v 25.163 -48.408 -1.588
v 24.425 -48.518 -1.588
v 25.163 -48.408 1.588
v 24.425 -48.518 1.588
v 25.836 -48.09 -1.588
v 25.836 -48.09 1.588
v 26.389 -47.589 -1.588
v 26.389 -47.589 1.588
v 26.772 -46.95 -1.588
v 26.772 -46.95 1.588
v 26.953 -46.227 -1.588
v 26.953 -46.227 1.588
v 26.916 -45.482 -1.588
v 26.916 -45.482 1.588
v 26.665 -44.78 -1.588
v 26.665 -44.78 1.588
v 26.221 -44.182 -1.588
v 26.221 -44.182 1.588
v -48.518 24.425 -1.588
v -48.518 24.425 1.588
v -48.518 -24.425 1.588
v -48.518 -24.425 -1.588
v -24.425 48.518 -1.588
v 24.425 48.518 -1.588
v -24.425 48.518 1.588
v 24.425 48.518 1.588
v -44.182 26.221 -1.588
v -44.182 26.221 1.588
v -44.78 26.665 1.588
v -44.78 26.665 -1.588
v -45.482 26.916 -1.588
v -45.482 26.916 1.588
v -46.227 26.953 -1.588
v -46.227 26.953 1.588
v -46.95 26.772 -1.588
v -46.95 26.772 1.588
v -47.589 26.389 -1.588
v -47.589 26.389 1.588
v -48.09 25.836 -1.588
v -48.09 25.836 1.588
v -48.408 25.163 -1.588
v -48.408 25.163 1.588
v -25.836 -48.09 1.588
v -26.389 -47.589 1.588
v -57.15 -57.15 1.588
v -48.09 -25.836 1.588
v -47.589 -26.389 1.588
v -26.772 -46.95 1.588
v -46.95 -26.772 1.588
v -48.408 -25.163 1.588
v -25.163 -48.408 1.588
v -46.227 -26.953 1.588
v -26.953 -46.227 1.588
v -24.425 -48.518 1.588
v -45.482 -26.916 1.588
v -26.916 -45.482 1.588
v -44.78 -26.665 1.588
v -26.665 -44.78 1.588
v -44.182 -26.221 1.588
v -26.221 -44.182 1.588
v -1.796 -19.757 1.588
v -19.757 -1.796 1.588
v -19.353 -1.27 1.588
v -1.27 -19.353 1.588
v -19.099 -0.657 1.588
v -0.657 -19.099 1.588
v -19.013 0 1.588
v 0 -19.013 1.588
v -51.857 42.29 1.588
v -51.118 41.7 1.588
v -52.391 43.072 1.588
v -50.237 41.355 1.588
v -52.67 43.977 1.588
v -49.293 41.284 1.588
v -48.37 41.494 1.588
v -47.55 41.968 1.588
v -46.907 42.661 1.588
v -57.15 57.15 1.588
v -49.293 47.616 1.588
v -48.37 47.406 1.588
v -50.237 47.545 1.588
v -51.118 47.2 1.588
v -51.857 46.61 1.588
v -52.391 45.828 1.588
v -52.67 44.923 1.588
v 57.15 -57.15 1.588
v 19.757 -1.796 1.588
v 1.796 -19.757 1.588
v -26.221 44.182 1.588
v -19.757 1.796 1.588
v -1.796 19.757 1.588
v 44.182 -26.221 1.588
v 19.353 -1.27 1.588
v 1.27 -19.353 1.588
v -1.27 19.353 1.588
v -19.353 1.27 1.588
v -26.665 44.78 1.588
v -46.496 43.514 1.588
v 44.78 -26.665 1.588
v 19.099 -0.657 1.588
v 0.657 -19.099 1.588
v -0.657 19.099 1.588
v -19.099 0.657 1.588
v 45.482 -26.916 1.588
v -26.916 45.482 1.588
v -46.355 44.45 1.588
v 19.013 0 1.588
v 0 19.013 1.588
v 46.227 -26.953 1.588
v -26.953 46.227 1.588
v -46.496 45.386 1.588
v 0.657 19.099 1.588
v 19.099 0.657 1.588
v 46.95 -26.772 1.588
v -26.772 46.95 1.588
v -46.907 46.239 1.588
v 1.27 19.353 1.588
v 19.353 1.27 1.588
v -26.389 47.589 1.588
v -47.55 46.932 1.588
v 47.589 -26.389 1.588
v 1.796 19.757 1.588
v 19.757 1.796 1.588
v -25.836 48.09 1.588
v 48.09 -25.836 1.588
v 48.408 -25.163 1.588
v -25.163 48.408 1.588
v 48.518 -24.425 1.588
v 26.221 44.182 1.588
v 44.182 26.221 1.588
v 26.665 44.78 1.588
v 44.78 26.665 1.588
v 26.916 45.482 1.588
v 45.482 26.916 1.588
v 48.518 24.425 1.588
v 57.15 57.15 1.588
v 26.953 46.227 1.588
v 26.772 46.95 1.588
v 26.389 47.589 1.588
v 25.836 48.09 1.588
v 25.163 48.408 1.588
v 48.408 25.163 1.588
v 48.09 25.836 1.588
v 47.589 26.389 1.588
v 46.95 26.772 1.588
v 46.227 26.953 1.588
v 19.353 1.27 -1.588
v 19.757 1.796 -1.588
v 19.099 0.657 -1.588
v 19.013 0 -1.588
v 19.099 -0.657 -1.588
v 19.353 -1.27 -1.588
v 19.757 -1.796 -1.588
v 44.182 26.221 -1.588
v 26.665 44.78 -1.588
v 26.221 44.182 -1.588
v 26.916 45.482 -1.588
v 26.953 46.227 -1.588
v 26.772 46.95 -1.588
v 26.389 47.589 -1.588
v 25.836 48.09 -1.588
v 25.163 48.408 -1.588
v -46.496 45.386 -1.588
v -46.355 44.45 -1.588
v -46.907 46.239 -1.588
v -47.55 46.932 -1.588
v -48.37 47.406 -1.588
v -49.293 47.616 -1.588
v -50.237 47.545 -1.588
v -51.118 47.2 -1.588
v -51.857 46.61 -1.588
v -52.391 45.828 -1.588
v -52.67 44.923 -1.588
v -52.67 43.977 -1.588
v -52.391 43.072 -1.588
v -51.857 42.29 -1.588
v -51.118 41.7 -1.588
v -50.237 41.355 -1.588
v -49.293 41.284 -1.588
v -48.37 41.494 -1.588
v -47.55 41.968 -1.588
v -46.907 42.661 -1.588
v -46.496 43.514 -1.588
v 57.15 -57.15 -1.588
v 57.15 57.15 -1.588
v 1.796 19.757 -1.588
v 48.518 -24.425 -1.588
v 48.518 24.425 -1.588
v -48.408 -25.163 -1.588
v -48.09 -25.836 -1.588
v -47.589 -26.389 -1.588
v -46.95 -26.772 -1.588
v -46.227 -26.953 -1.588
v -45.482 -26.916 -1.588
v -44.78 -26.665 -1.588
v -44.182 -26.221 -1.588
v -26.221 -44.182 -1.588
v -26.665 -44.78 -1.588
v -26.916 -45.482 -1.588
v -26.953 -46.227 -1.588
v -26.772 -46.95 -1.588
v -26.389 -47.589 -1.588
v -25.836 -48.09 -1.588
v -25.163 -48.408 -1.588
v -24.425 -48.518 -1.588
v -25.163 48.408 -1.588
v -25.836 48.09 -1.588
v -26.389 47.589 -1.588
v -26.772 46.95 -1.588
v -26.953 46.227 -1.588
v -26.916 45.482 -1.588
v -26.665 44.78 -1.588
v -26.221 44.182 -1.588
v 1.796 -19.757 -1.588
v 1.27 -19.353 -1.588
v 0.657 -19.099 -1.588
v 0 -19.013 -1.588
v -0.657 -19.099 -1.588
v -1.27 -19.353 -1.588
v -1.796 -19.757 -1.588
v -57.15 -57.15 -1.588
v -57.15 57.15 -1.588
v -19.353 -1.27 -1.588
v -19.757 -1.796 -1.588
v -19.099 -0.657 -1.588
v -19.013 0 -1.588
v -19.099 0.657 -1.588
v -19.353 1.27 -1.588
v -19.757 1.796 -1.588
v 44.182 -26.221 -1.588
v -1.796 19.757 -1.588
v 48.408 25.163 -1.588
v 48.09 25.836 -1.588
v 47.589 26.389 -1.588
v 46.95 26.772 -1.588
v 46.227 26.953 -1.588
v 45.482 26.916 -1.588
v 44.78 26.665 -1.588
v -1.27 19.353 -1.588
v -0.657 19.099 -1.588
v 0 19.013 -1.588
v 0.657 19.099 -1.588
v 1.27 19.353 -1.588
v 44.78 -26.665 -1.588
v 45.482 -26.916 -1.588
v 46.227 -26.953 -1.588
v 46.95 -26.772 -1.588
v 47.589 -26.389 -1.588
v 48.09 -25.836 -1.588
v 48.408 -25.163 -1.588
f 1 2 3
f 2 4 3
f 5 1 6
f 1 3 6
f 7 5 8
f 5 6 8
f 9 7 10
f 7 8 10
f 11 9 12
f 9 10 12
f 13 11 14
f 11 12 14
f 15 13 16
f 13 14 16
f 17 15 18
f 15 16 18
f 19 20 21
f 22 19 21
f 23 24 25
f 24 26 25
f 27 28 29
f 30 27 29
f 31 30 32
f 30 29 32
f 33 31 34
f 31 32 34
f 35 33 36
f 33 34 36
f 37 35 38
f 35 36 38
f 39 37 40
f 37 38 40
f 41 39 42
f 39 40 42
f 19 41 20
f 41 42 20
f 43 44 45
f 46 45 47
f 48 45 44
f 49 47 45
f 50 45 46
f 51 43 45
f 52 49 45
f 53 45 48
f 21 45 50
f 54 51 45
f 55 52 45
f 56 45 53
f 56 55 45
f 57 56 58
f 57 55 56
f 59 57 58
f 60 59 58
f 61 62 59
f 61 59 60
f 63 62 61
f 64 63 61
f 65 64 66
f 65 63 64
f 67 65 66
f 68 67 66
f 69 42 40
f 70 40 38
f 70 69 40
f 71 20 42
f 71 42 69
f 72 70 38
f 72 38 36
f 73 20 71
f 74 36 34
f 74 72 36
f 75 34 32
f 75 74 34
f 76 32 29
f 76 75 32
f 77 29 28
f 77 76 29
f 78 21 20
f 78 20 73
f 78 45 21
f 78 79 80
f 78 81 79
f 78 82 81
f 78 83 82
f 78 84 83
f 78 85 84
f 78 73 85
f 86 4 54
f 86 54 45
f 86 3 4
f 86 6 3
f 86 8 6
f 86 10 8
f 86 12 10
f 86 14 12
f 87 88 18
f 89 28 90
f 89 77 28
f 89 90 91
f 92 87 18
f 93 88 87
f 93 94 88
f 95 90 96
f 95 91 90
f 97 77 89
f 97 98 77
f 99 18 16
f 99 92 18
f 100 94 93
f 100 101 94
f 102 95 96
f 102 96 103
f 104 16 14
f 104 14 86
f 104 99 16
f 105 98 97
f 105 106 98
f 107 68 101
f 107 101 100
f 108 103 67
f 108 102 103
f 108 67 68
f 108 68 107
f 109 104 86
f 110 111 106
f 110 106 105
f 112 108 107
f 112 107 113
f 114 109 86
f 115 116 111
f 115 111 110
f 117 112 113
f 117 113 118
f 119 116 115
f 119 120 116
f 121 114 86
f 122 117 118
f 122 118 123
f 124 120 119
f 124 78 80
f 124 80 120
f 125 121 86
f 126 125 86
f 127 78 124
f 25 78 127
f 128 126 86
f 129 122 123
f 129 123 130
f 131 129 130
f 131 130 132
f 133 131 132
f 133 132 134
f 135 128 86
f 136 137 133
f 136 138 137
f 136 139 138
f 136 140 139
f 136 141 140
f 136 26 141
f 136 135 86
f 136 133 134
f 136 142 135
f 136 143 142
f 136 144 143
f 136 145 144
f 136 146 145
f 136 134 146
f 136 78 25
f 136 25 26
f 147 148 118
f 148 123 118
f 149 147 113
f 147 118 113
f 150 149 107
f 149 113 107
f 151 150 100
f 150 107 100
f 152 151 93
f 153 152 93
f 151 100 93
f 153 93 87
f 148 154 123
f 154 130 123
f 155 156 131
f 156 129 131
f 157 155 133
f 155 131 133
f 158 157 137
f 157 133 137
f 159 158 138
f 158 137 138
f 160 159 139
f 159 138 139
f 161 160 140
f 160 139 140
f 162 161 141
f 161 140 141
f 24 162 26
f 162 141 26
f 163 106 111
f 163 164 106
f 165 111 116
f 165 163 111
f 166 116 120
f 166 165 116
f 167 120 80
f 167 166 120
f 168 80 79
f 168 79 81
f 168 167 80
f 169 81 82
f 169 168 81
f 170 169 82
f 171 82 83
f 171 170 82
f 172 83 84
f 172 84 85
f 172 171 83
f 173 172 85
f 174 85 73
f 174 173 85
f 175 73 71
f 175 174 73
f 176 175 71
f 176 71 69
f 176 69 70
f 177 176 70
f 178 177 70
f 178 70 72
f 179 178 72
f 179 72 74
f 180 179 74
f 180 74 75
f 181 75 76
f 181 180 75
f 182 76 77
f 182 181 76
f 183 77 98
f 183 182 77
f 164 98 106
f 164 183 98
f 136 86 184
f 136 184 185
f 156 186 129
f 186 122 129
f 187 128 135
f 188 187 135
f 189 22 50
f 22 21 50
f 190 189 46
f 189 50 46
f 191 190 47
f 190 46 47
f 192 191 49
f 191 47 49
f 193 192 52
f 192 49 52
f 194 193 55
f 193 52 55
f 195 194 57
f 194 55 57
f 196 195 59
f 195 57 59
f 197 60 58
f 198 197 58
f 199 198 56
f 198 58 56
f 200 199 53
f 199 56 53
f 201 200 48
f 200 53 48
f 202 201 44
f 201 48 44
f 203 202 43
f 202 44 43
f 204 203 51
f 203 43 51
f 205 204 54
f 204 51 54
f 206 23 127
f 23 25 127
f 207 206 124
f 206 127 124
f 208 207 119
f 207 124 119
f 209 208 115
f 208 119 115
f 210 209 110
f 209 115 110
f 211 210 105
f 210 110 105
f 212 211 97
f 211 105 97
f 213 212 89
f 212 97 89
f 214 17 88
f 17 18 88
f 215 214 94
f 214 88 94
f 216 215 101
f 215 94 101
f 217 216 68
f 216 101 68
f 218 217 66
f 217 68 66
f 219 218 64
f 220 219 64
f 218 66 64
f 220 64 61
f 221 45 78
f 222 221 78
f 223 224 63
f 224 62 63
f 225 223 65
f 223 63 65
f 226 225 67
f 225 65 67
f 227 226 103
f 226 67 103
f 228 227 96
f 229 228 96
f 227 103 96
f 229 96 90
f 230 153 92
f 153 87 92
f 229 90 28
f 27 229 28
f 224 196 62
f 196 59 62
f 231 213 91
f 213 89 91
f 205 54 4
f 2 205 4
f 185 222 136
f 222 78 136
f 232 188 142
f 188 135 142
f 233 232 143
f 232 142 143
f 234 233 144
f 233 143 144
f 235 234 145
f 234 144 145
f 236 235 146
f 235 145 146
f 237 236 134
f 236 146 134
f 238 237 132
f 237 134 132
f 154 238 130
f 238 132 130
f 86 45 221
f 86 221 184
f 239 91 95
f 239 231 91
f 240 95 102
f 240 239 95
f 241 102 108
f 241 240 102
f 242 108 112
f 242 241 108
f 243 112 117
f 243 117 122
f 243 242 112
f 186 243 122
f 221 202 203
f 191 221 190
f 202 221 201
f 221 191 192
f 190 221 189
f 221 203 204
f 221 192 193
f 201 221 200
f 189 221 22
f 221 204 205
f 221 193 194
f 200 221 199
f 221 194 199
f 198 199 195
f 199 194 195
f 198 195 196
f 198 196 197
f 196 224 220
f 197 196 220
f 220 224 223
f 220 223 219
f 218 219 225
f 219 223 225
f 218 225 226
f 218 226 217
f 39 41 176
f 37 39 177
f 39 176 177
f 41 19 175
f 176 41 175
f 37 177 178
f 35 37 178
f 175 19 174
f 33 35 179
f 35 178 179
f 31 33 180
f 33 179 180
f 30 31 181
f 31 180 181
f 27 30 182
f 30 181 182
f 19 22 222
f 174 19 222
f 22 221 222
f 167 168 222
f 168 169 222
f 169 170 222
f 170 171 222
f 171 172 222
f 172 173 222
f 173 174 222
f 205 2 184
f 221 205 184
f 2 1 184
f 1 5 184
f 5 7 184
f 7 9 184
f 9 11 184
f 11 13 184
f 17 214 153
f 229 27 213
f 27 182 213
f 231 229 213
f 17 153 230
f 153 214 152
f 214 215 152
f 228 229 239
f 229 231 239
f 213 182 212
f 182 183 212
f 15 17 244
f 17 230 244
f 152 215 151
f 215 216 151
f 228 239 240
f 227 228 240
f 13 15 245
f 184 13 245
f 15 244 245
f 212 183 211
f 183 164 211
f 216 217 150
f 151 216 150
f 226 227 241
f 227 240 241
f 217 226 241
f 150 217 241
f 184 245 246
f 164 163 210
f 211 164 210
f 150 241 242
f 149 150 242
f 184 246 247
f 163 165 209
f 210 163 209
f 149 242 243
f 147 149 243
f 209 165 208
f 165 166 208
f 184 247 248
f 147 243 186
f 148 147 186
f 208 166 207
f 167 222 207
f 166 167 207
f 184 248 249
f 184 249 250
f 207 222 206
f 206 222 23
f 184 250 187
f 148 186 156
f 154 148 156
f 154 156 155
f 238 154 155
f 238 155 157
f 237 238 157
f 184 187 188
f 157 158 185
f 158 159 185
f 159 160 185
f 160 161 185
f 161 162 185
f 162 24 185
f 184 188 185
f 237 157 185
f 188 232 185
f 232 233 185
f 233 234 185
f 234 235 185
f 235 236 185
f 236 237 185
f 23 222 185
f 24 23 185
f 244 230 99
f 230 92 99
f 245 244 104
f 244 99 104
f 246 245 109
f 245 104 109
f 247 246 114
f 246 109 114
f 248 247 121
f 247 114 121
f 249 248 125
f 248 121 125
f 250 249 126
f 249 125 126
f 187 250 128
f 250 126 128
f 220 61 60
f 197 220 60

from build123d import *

# Parameters (mm, degrees)
SKETCH1_W           = 114.3
SKETCH1_H           = 114.3
SKETCH1_R           = 3.175
BOSS_EXTRUDE2_DEPTH = 1.5875


with BuildPart() as part:
    # Sketch1 → Boss-Extrude2 (new, symmetric)
    with BuildSketch(Plane.XY):
        Rectangle(SKETCH1_W, SKETCH1_H)
        with Locations((-49.53, 44.45)):
            Circle(SKETCH1_R, mode=Mode.SUBTRACT)
        with BuildLine():
            Line((-24.425187853, -48.517802544), (24.425187853, -48.517802544))
            ThreePointArc((24.425187853, -48.517802544), (26.771841866, -46.949818462), (26.221239077, -44.181751319))
            Line((26.221239077, -44.181751319), (1.796051224, -19.756563466))
            ThreePointArc((1.796051224, -19.756563466), (0, -19.012614691), (-1.796051224, -19.756563466))
            Line((-1.796051224, -19.756563466), (-26.221239077, -44.181751319))
            ThreePointArc((-26.221239077, -44.181751319), (-26.771841866, -46.949818462), (-24.425187853, -48.517802544))
        make_face(mode=Mode.SUBTRACT)
        with BuildLine():
            Line((-48.517802544, 24.425187853), (-48.517802544, -24.425187853))
            ThreePointArc((-48.517802544, -24.425187853), (-46.949818462, -26.771841866), (-44.181751319, -26.221239077))
            Line((-44.181751319, -26.221239077), (-19.756563466, -1.796051224))
            ThreePointArc((-19.756563466, -1.796051224), (-19.012614691, 0), (-19.756563466, 1.796051224))
            Line((-19.756563466, 1.796051224), (-44.181751319, 26.221239077))
            ThreePointArc((-44.181751319, 26.221239077), (-46.949818462, 26.771841866), (-48.517802544, 24.425187853))
        make_face(mode=Mode.SUBTRACT)
        with BuildLine():
            Line((24.425187853, 48.517802544), (-24.425187853, 48.517802544))
            ThreePointArc((-24.425187853, 48.517802544), (-26.771841866, 46.949818462), (-26.221239077, 44.181751319))
            Line((-26.221239077, 44.181751319), (-1.796051224, 19.756563466))
            ThreePointArc((-1.796051224, 19.756563466), (0, 19.012614691), (1.796051224, 19.756563466))
            Line((1.796051224, 19.756563466), (26.221239077, 44.181751319))
            ThreePointArc((26.221239077, 44.181751319), (26.771841866, 46.949818462), (24.425187853, 48.517802544))
        make_face(mode=Mode.SUBTRACT)
        with BuildLine():
            Line((48.517802544, -24.425187853), (48.517802544, 24.425187853))
            ThreePointArc((48.517802544, 24.425187853), (46.949818462, 26.771841866), (44.181751319, 26.221239077))
            Line((44.181751319, 26.221239077), (19.756563466, 1.796051224))
            ThreePointArc((19.756563466, 1.796051224), (19.012614691, 0), (19.756563466, -1.796051224))
            Line((19.756563466, -1.796051224), (44.181751319, -26.221239077))
            ThreePointArc((44.181751319, -26.221239077), (46.949818462, -26.771841866), (48.517802544, -24.425187853))
        make_face(mode=Mode.SUBTRACT)
    extrude(amount=BOSS_EXTRUDE2_DEPTH, both=True)


solid = part.part
